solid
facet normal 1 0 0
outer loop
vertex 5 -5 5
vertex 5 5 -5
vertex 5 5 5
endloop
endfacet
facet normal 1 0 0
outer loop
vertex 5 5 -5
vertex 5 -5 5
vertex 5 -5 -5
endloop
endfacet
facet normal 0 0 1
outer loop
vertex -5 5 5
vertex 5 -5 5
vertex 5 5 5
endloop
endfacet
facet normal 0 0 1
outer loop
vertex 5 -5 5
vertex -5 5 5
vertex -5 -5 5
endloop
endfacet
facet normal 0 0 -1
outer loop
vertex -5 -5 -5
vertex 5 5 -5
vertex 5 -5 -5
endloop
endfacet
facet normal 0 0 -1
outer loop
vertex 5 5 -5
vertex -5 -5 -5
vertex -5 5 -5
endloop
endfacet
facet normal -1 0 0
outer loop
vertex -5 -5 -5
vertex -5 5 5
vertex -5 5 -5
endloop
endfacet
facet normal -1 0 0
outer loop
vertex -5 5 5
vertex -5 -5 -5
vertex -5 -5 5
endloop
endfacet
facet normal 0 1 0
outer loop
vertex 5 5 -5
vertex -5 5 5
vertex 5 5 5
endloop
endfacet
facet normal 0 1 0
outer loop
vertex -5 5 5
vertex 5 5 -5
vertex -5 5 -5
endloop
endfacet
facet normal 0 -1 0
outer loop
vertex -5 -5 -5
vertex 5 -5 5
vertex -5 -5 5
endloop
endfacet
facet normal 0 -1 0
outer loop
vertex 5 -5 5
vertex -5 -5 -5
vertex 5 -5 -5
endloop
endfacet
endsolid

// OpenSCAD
// Pinya3 3D Food Printer
// file: frame.scad 
// author: Luis Rodriguez
// version: 0.1
// w3b: 3digitalcooks.com 

// Variables

  frame();

module frame(){
color("SlateGray",0.7)
  difference(){
    union(){ // Add
      cube([10, 10, 10], center=true); 
      }
    union(){ // Substract
      }
  }
}
